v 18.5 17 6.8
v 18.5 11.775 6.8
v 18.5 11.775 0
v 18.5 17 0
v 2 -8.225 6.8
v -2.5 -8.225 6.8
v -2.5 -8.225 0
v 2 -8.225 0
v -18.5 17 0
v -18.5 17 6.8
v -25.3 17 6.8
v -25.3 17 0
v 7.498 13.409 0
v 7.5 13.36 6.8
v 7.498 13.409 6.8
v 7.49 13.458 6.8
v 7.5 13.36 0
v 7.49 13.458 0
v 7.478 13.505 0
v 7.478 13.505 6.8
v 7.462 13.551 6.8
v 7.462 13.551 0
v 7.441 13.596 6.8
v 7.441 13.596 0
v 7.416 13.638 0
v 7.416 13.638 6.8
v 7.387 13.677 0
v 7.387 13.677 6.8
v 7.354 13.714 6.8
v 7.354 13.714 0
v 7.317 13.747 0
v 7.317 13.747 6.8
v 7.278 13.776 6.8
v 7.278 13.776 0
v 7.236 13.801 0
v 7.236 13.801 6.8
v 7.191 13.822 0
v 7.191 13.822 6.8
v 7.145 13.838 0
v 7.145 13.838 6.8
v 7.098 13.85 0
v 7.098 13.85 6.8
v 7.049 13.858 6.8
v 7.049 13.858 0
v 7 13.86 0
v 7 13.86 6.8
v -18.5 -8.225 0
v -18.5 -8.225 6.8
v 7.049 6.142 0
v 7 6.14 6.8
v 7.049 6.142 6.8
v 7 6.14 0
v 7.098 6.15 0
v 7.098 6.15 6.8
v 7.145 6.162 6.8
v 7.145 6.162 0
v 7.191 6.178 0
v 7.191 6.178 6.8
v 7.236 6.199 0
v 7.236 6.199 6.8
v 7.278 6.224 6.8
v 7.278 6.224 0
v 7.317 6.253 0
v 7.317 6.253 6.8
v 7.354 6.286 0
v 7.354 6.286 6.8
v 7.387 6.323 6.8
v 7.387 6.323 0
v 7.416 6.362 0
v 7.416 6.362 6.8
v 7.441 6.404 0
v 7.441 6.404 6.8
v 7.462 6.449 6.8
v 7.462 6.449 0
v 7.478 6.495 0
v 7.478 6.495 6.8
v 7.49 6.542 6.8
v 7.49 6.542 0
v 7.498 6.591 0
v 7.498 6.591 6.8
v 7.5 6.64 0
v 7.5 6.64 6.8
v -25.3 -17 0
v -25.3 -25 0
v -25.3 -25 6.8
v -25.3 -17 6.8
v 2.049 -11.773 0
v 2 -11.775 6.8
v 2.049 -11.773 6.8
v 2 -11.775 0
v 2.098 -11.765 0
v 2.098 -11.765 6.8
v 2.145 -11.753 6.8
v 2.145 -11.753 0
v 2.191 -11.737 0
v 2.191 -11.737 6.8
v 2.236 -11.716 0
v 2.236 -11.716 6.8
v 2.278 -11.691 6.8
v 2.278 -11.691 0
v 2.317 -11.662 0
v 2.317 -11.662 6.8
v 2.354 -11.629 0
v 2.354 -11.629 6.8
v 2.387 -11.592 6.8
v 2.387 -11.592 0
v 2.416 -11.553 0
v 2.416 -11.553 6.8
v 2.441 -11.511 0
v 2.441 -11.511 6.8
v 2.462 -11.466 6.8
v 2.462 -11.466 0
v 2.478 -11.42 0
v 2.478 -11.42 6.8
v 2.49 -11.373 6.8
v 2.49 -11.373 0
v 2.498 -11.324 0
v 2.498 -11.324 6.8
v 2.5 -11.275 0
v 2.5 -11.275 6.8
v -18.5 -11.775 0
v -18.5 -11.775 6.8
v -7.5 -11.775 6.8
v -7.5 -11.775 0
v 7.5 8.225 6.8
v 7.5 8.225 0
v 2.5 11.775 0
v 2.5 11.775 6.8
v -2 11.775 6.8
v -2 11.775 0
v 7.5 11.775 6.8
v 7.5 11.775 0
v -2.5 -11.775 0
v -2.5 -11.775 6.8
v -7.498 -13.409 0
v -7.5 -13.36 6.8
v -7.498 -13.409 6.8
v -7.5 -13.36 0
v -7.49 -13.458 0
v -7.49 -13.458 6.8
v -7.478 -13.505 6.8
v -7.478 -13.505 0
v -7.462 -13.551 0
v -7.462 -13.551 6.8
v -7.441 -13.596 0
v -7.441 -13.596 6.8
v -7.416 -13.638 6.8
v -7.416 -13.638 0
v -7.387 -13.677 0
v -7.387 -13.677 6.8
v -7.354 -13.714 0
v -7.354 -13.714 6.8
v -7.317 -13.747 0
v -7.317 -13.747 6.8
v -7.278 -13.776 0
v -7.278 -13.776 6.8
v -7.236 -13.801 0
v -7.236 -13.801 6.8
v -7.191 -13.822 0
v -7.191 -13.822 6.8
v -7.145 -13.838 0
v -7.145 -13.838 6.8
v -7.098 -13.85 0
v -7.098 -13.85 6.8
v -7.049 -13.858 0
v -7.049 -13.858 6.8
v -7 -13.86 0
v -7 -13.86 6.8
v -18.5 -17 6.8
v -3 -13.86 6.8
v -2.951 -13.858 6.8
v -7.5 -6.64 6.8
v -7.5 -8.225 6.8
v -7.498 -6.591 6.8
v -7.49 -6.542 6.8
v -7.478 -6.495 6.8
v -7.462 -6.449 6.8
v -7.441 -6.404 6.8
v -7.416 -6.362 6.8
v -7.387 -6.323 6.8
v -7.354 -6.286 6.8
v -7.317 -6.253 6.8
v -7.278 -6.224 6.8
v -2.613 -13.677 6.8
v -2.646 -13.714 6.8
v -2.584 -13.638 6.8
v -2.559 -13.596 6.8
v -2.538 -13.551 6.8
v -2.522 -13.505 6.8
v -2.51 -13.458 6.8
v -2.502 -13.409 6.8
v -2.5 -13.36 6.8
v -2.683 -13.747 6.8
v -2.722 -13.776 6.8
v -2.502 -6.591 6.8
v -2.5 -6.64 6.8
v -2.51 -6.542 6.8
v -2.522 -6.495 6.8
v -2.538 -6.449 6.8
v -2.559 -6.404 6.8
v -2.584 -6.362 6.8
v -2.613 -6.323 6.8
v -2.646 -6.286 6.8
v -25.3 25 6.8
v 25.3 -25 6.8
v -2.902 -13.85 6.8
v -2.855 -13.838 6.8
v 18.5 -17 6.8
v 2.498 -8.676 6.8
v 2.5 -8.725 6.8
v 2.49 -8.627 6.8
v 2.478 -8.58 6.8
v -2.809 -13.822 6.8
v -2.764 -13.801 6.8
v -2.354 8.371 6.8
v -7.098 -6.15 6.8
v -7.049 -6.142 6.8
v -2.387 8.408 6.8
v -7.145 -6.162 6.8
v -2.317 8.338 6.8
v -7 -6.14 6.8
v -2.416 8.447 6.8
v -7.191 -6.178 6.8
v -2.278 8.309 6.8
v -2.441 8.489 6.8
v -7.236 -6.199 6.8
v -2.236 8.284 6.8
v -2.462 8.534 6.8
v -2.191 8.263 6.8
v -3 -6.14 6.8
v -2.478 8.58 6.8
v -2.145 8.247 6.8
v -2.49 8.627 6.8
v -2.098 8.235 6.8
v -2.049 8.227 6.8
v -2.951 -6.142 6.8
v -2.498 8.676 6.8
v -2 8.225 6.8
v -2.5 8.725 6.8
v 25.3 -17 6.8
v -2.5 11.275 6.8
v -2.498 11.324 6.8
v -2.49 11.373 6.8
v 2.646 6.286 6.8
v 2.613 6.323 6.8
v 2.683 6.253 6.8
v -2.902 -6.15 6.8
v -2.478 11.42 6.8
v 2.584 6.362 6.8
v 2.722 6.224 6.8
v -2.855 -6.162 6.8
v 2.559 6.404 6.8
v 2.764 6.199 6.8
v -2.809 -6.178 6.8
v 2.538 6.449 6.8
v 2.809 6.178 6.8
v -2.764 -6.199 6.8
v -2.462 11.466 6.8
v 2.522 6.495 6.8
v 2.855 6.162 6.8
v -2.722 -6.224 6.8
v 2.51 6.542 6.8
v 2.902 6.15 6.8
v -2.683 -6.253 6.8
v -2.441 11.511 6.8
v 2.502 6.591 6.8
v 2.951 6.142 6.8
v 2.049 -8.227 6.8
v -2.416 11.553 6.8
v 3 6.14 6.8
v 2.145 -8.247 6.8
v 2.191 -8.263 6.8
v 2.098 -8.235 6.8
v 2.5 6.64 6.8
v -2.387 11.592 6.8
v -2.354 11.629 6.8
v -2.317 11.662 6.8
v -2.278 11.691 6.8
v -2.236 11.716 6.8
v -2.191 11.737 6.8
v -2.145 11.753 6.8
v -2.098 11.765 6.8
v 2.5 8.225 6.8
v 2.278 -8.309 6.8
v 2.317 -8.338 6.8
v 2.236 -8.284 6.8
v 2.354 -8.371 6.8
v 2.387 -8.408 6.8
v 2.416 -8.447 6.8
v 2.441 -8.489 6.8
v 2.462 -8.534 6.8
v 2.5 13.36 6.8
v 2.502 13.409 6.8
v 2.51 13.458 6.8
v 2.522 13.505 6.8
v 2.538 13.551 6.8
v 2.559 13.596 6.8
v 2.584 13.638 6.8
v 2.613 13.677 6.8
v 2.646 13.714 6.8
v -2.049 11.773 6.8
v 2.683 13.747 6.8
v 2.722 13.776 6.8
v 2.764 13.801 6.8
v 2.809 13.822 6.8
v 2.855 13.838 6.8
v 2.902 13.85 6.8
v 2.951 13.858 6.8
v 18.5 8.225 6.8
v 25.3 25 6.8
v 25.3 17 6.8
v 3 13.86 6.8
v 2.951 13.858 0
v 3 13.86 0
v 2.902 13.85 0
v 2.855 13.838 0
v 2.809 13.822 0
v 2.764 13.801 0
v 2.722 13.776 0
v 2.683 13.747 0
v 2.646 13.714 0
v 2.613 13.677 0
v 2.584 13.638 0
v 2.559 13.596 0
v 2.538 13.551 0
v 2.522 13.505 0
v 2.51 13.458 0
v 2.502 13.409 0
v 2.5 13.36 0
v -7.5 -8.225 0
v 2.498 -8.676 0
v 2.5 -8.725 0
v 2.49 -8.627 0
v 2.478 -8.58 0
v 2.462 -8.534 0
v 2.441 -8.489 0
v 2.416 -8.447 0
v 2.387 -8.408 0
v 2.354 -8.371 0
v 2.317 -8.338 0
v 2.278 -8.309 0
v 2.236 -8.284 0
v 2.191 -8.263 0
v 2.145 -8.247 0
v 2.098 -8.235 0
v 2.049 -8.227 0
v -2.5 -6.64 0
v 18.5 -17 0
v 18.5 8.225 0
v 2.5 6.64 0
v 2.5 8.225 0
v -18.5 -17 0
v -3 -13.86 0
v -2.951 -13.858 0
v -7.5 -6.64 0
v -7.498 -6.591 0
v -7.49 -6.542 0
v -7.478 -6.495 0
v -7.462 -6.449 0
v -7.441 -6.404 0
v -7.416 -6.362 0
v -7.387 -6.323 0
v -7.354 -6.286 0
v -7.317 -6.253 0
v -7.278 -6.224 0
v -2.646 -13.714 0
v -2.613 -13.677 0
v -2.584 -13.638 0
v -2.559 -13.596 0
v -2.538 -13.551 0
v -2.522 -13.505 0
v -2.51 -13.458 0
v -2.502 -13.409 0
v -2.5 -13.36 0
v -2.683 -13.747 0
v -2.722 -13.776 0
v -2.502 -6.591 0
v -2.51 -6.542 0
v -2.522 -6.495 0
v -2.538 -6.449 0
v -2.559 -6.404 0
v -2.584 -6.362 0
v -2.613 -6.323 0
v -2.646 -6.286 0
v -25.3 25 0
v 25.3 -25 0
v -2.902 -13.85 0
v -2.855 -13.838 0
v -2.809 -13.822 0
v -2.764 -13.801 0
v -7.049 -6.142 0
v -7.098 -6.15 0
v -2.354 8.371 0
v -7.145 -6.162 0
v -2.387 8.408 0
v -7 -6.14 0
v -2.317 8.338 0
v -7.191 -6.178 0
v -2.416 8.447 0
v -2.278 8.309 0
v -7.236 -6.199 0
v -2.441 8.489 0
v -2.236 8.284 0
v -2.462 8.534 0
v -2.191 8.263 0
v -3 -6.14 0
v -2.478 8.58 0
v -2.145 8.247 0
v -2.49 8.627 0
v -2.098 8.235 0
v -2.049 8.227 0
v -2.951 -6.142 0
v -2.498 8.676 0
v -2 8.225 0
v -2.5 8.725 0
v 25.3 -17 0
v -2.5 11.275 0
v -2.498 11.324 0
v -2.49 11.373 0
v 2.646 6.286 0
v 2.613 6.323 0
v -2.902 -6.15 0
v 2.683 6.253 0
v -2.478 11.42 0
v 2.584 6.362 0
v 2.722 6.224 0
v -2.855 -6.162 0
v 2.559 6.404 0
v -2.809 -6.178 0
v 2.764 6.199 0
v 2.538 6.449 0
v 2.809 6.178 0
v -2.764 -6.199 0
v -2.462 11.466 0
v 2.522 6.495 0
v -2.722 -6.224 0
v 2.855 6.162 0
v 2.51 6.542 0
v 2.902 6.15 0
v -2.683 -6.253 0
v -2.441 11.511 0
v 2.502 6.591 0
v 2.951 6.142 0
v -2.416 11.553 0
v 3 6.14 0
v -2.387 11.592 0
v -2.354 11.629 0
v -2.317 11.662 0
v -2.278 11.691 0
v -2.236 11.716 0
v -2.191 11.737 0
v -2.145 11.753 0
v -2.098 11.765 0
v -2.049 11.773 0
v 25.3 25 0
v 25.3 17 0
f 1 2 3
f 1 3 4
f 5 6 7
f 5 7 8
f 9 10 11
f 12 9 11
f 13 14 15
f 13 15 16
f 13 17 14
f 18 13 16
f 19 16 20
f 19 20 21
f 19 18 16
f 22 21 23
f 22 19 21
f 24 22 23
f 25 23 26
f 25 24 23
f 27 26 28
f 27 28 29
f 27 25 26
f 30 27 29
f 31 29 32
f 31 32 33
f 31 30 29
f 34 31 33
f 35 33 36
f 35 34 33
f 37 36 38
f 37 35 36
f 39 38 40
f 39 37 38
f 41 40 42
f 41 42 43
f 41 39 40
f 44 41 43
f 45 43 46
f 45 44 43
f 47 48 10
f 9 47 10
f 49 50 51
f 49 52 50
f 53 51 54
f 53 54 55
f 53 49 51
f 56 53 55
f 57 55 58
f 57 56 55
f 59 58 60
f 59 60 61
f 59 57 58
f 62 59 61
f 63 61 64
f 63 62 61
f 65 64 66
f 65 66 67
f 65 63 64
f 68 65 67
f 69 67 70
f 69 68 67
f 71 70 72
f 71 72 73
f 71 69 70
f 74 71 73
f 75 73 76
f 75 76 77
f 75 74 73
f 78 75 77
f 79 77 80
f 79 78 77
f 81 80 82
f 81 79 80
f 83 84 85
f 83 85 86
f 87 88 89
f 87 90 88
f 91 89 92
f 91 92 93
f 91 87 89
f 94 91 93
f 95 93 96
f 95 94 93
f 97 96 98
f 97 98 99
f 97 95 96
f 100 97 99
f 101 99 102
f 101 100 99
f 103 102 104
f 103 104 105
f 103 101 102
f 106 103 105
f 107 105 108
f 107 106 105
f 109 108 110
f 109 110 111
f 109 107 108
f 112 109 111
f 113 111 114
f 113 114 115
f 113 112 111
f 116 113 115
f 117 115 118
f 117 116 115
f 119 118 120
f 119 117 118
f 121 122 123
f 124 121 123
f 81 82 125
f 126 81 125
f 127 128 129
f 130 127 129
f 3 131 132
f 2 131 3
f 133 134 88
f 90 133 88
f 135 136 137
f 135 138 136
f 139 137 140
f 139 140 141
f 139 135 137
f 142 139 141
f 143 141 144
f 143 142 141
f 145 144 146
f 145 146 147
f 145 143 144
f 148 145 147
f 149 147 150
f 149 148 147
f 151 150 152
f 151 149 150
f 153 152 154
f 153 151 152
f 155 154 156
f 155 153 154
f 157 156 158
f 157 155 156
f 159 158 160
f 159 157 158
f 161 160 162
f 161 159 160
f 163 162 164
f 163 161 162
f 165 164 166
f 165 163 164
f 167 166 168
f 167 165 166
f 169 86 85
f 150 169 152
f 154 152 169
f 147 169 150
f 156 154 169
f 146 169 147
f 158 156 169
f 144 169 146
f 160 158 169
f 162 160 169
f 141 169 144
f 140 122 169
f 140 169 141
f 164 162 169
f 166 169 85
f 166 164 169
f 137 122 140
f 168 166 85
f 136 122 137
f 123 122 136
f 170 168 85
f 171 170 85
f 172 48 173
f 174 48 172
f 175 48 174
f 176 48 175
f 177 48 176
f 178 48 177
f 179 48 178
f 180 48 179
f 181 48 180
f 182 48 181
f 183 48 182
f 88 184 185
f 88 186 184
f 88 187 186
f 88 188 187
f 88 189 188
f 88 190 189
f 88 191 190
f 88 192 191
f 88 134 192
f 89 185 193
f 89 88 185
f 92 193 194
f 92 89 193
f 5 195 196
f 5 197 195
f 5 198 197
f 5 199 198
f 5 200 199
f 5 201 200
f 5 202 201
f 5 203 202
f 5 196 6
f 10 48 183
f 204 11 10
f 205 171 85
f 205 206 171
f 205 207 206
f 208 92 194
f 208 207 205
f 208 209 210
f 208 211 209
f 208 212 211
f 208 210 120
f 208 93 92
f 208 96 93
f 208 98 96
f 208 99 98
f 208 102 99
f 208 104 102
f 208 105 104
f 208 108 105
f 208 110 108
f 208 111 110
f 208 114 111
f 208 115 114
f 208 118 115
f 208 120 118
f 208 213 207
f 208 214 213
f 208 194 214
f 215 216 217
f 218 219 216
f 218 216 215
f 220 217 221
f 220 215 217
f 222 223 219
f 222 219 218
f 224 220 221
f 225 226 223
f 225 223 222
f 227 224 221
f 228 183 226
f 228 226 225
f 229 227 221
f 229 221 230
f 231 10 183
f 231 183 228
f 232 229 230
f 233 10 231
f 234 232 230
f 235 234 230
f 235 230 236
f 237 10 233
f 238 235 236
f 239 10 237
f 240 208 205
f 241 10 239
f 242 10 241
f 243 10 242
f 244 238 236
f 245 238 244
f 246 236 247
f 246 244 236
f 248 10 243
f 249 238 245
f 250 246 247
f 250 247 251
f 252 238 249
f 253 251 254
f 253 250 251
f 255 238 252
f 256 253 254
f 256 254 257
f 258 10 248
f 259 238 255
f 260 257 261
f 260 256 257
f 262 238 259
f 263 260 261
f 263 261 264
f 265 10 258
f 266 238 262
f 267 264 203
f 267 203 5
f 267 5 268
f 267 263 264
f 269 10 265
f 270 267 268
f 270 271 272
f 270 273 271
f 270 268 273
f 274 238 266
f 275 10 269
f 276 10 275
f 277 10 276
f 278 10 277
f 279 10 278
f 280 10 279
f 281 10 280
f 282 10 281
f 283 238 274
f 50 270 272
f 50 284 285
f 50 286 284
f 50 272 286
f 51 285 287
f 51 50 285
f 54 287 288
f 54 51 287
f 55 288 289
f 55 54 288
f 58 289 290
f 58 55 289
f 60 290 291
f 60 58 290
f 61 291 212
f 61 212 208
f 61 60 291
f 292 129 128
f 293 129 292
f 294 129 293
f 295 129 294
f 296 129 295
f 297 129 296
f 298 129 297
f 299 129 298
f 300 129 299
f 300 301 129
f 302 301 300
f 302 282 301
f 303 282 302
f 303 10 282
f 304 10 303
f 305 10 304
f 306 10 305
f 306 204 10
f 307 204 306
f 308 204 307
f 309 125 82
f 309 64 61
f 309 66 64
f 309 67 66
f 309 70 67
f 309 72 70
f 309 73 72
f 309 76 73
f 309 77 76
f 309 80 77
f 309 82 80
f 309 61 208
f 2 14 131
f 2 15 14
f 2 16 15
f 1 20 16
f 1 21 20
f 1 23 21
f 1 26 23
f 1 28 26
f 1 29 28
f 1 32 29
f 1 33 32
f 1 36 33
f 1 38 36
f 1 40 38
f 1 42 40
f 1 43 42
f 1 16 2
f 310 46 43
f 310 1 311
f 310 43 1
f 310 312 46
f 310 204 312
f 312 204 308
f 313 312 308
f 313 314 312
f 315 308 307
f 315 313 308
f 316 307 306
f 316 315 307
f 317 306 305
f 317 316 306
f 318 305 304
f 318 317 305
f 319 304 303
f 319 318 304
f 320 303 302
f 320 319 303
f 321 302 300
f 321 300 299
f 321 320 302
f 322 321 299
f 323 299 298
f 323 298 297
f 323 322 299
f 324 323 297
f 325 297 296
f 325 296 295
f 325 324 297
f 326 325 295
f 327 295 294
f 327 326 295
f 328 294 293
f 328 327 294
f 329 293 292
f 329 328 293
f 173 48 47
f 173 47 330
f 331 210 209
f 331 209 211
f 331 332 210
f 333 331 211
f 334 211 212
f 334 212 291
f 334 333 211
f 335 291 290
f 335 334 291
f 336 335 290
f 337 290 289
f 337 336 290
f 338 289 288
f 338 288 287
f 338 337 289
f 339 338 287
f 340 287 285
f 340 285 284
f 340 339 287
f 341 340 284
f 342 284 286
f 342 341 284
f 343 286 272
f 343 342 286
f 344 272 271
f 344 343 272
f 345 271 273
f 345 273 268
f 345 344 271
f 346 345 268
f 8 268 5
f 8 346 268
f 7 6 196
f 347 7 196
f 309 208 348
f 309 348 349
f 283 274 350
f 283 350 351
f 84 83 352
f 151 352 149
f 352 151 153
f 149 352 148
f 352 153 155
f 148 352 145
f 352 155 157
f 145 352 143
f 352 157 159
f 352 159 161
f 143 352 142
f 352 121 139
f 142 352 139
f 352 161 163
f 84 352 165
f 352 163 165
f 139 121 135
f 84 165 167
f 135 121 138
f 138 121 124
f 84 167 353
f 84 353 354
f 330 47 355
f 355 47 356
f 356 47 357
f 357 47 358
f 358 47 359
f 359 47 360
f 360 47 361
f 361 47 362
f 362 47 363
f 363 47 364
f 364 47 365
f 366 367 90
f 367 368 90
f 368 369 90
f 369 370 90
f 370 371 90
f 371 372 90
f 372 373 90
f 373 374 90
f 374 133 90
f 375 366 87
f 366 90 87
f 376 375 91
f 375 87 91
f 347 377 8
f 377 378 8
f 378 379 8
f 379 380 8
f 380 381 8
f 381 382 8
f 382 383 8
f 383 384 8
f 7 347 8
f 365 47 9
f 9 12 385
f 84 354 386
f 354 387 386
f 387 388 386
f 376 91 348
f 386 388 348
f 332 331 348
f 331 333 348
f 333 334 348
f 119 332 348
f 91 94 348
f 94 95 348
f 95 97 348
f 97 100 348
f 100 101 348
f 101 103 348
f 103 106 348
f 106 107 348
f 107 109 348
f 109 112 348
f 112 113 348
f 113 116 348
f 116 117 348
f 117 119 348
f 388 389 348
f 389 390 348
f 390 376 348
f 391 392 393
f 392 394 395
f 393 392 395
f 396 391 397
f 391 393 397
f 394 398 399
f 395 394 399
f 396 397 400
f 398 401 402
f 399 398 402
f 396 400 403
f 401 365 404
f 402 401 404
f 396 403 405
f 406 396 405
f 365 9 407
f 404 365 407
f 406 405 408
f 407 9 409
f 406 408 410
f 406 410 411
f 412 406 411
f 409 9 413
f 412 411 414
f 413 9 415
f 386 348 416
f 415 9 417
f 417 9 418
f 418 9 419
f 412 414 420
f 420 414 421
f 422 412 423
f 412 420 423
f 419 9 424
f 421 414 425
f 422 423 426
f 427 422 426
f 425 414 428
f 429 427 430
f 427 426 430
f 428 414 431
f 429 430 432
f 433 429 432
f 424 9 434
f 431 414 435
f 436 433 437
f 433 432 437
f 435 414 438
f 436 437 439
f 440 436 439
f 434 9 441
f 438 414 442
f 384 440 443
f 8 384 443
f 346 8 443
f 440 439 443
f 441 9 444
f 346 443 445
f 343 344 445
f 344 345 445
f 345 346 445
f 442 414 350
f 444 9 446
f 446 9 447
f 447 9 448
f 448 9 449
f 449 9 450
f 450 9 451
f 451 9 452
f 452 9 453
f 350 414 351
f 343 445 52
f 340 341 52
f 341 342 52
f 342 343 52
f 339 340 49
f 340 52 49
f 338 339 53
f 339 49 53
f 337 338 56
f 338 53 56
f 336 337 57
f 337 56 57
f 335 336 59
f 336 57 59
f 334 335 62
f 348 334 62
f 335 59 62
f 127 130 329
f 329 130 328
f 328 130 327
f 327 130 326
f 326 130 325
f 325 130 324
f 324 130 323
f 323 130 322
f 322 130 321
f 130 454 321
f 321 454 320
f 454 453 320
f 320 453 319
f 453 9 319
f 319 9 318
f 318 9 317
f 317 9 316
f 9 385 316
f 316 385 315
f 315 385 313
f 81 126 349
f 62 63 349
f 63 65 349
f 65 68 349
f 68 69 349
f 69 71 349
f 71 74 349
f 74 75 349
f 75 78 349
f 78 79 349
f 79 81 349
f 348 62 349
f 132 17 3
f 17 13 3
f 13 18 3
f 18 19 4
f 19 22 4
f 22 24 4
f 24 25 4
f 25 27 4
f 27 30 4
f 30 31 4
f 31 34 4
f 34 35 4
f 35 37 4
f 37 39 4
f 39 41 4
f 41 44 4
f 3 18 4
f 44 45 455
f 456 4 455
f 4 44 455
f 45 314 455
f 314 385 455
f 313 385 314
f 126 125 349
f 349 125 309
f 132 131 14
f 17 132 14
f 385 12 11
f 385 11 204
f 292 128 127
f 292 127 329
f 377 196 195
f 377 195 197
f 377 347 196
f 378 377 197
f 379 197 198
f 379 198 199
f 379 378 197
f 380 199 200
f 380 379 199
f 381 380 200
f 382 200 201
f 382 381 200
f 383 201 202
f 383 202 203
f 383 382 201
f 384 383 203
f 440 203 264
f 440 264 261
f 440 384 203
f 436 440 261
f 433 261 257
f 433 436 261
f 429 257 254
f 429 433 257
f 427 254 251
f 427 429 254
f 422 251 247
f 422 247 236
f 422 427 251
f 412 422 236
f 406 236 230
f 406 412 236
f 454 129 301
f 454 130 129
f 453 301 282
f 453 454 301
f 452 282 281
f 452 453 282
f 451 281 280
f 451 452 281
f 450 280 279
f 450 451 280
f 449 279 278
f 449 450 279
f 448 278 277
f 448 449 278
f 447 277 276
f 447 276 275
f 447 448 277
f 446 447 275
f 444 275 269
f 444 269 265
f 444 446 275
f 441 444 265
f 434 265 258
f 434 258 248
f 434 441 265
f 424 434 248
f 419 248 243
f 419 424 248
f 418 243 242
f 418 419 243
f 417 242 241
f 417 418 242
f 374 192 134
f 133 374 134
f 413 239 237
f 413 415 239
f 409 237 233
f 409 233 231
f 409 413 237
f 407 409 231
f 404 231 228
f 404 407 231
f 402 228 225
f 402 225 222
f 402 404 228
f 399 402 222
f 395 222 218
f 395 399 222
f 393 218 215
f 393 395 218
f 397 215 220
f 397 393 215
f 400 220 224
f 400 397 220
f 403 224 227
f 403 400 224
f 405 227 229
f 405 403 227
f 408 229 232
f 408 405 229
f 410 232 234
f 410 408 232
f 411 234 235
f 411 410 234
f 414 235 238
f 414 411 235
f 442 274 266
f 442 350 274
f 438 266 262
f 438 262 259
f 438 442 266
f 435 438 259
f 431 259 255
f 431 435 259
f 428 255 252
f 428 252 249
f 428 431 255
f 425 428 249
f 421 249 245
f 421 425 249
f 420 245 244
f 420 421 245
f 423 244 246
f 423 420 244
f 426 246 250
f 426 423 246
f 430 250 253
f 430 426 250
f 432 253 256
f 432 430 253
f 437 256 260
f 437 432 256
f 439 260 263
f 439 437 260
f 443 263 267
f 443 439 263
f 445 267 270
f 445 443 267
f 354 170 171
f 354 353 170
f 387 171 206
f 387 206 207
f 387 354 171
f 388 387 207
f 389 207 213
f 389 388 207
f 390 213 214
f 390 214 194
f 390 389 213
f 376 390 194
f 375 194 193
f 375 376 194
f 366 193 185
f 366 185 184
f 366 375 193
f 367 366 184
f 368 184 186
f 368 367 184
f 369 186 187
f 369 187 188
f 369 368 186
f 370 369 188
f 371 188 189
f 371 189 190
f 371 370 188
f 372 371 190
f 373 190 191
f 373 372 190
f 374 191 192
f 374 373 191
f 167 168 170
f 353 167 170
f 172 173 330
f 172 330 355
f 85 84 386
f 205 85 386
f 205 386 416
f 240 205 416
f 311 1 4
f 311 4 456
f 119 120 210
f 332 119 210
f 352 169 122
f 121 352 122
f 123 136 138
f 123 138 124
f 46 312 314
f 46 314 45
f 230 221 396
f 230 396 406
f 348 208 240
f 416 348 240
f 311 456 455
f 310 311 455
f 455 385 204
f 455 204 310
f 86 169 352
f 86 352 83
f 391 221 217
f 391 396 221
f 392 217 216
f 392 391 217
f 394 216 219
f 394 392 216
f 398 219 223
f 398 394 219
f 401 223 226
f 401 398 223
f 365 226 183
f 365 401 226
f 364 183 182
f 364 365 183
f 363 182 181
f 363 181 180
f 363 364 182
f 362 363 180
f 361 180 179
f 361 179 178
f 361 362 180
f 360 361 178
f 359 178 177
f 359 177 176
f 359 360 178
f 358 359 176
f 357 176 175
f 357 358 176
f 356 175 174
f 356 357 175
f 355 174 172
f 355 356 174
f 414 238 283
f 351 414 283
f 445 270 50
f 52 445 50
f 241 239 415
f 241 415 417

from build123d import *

# Parameters (mm, degrees)
SKETCH1_W           = 50.6
SKETCH1_H           = 50
BOSS_EXTRUDE1_DEPTH = 6.8
SKETCH2_W           = 6.8
SKETCH2_H           = 34
CUT_EXTRUDE1_DEPTH  = 6.8
SKETCH3_W           = 5
SKETCH3_H           = 3.55
SKETCH3_H_2         = 2.085
SKETCH3_W_2         = 11
CUT_EXTRUDE2_DEPTH  = 6.8
FILLET1_R           = 0.5


with BuildPart() as part:
    # Sketch1 → Boss-Extrude1 (new body)
    with BuildSketch(Plane.XY):
        Rectangle(SKETCH1_W, SKETCH1_H)
    extrude(amount=BOSS_EXTRUDE1_DEPTH)

    # Sketch2 → Cut-Extrude1 (cut)
    with BuildSketch(Plane.XY.offset(6.8)):
        with Locations((21.9, 0)):
            Rectangle(SKETCH2_W, SKETCH2_H)
    cut_extrude1 = extrude(amount=-CUT_EXTRUDE1_DEPTH, mode=Mode.SUBTRACT)

    # Mirror1: Cut-Extrude1 across plane
    add(cut_extrude1.mirror(Plane(origin=(0, 0, 0), x_dir=(0, 0, 1), z_dir=(1, 0, 0))), mode=Mode.SUBTRACT)

    # Sketch3 → Cut-Extrude2 (cut)
    with BuildSketch(Plane.XY.offset(6.8)):
        with Locations((0, -10)):
            Rectangle(SKETCH3_W, SKETCH3_H)
        with Locations((-5, -12.8175)):
            Rectangle(SKETCH3_W, SKETCH3_H_2)
        with Locations((-13, -10)):
            Rectangle(SKETCH3_W_2, SKETCH3_H)
        with Locations((-5, -7.1825)):
            Rectangle(SKETCH3_W, SKETCH3_H_2)
        with Locations((-5, -10)):
            Rectangle(SKETCH3_W, SKETCH3_H)
        with Locations((5, 10)):
            Rectangle(SKETCH3_W, SKETCH3_H)
        with Locations((0, 10)):
            Rectangle(SKETCH3_W, SKETCH3_H)
        with Locations((5, 7.1825)):
            Rectangle(SKETCH3_W, SKETCH3_H_2)
        with Locations((5, 12.8175)):
            Rectangle(SKETCH3_W, SKETCH3_H_2)
        with Locations((13, 10)):
            Rectangle(SKETCH3_W_2, SKETCH3_H)
    extrude(amount=-CUT_EXTRUDE2_DEPTH, mode=Mode.SUBTRACT)

    # Fillet1
    fillet1_edges = [part.edges().sort_by_distance(p)[0] for p in [
        (2.5, -8.225, 3.4),
        (2.5, -11.775, 3.4),
        (-2.5, -13.86, 3.4),
        (-7.5, -13.86, 3.4),
        (-7.5, -6.14, 3.4),
        (-2.5, -6.14, 3.4),
        (-2.5, 8.225, 3.4),
        (-2.5, 11.775, 3.4),
        (2.5, 13.86, 3.4),
        (7.5, 13.86, 3.4),
        (7.5, 6.14, 3.4),
        (2.5, 6.14, 3.4),
    ]]
    fillet(fillet1_edges, radius=FILLET1_R)


solid = part.part
